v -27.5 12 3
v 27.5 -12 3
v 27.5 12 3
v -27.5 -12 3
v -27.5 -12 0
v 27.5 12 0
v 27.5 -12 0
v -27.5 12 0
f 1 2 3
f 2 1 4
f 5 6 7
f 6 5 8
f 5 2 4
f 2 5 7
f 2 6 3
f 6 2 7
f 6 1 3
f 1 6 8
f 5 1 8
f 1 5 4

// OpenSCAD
// Generated with SolidPython2 for OpenSCAD task-015
$fn = 64;

union() {
	translate(v = [-27.5, -12.0, 0]) {
		cube(size = [55, 24, 3]);
	}
}
